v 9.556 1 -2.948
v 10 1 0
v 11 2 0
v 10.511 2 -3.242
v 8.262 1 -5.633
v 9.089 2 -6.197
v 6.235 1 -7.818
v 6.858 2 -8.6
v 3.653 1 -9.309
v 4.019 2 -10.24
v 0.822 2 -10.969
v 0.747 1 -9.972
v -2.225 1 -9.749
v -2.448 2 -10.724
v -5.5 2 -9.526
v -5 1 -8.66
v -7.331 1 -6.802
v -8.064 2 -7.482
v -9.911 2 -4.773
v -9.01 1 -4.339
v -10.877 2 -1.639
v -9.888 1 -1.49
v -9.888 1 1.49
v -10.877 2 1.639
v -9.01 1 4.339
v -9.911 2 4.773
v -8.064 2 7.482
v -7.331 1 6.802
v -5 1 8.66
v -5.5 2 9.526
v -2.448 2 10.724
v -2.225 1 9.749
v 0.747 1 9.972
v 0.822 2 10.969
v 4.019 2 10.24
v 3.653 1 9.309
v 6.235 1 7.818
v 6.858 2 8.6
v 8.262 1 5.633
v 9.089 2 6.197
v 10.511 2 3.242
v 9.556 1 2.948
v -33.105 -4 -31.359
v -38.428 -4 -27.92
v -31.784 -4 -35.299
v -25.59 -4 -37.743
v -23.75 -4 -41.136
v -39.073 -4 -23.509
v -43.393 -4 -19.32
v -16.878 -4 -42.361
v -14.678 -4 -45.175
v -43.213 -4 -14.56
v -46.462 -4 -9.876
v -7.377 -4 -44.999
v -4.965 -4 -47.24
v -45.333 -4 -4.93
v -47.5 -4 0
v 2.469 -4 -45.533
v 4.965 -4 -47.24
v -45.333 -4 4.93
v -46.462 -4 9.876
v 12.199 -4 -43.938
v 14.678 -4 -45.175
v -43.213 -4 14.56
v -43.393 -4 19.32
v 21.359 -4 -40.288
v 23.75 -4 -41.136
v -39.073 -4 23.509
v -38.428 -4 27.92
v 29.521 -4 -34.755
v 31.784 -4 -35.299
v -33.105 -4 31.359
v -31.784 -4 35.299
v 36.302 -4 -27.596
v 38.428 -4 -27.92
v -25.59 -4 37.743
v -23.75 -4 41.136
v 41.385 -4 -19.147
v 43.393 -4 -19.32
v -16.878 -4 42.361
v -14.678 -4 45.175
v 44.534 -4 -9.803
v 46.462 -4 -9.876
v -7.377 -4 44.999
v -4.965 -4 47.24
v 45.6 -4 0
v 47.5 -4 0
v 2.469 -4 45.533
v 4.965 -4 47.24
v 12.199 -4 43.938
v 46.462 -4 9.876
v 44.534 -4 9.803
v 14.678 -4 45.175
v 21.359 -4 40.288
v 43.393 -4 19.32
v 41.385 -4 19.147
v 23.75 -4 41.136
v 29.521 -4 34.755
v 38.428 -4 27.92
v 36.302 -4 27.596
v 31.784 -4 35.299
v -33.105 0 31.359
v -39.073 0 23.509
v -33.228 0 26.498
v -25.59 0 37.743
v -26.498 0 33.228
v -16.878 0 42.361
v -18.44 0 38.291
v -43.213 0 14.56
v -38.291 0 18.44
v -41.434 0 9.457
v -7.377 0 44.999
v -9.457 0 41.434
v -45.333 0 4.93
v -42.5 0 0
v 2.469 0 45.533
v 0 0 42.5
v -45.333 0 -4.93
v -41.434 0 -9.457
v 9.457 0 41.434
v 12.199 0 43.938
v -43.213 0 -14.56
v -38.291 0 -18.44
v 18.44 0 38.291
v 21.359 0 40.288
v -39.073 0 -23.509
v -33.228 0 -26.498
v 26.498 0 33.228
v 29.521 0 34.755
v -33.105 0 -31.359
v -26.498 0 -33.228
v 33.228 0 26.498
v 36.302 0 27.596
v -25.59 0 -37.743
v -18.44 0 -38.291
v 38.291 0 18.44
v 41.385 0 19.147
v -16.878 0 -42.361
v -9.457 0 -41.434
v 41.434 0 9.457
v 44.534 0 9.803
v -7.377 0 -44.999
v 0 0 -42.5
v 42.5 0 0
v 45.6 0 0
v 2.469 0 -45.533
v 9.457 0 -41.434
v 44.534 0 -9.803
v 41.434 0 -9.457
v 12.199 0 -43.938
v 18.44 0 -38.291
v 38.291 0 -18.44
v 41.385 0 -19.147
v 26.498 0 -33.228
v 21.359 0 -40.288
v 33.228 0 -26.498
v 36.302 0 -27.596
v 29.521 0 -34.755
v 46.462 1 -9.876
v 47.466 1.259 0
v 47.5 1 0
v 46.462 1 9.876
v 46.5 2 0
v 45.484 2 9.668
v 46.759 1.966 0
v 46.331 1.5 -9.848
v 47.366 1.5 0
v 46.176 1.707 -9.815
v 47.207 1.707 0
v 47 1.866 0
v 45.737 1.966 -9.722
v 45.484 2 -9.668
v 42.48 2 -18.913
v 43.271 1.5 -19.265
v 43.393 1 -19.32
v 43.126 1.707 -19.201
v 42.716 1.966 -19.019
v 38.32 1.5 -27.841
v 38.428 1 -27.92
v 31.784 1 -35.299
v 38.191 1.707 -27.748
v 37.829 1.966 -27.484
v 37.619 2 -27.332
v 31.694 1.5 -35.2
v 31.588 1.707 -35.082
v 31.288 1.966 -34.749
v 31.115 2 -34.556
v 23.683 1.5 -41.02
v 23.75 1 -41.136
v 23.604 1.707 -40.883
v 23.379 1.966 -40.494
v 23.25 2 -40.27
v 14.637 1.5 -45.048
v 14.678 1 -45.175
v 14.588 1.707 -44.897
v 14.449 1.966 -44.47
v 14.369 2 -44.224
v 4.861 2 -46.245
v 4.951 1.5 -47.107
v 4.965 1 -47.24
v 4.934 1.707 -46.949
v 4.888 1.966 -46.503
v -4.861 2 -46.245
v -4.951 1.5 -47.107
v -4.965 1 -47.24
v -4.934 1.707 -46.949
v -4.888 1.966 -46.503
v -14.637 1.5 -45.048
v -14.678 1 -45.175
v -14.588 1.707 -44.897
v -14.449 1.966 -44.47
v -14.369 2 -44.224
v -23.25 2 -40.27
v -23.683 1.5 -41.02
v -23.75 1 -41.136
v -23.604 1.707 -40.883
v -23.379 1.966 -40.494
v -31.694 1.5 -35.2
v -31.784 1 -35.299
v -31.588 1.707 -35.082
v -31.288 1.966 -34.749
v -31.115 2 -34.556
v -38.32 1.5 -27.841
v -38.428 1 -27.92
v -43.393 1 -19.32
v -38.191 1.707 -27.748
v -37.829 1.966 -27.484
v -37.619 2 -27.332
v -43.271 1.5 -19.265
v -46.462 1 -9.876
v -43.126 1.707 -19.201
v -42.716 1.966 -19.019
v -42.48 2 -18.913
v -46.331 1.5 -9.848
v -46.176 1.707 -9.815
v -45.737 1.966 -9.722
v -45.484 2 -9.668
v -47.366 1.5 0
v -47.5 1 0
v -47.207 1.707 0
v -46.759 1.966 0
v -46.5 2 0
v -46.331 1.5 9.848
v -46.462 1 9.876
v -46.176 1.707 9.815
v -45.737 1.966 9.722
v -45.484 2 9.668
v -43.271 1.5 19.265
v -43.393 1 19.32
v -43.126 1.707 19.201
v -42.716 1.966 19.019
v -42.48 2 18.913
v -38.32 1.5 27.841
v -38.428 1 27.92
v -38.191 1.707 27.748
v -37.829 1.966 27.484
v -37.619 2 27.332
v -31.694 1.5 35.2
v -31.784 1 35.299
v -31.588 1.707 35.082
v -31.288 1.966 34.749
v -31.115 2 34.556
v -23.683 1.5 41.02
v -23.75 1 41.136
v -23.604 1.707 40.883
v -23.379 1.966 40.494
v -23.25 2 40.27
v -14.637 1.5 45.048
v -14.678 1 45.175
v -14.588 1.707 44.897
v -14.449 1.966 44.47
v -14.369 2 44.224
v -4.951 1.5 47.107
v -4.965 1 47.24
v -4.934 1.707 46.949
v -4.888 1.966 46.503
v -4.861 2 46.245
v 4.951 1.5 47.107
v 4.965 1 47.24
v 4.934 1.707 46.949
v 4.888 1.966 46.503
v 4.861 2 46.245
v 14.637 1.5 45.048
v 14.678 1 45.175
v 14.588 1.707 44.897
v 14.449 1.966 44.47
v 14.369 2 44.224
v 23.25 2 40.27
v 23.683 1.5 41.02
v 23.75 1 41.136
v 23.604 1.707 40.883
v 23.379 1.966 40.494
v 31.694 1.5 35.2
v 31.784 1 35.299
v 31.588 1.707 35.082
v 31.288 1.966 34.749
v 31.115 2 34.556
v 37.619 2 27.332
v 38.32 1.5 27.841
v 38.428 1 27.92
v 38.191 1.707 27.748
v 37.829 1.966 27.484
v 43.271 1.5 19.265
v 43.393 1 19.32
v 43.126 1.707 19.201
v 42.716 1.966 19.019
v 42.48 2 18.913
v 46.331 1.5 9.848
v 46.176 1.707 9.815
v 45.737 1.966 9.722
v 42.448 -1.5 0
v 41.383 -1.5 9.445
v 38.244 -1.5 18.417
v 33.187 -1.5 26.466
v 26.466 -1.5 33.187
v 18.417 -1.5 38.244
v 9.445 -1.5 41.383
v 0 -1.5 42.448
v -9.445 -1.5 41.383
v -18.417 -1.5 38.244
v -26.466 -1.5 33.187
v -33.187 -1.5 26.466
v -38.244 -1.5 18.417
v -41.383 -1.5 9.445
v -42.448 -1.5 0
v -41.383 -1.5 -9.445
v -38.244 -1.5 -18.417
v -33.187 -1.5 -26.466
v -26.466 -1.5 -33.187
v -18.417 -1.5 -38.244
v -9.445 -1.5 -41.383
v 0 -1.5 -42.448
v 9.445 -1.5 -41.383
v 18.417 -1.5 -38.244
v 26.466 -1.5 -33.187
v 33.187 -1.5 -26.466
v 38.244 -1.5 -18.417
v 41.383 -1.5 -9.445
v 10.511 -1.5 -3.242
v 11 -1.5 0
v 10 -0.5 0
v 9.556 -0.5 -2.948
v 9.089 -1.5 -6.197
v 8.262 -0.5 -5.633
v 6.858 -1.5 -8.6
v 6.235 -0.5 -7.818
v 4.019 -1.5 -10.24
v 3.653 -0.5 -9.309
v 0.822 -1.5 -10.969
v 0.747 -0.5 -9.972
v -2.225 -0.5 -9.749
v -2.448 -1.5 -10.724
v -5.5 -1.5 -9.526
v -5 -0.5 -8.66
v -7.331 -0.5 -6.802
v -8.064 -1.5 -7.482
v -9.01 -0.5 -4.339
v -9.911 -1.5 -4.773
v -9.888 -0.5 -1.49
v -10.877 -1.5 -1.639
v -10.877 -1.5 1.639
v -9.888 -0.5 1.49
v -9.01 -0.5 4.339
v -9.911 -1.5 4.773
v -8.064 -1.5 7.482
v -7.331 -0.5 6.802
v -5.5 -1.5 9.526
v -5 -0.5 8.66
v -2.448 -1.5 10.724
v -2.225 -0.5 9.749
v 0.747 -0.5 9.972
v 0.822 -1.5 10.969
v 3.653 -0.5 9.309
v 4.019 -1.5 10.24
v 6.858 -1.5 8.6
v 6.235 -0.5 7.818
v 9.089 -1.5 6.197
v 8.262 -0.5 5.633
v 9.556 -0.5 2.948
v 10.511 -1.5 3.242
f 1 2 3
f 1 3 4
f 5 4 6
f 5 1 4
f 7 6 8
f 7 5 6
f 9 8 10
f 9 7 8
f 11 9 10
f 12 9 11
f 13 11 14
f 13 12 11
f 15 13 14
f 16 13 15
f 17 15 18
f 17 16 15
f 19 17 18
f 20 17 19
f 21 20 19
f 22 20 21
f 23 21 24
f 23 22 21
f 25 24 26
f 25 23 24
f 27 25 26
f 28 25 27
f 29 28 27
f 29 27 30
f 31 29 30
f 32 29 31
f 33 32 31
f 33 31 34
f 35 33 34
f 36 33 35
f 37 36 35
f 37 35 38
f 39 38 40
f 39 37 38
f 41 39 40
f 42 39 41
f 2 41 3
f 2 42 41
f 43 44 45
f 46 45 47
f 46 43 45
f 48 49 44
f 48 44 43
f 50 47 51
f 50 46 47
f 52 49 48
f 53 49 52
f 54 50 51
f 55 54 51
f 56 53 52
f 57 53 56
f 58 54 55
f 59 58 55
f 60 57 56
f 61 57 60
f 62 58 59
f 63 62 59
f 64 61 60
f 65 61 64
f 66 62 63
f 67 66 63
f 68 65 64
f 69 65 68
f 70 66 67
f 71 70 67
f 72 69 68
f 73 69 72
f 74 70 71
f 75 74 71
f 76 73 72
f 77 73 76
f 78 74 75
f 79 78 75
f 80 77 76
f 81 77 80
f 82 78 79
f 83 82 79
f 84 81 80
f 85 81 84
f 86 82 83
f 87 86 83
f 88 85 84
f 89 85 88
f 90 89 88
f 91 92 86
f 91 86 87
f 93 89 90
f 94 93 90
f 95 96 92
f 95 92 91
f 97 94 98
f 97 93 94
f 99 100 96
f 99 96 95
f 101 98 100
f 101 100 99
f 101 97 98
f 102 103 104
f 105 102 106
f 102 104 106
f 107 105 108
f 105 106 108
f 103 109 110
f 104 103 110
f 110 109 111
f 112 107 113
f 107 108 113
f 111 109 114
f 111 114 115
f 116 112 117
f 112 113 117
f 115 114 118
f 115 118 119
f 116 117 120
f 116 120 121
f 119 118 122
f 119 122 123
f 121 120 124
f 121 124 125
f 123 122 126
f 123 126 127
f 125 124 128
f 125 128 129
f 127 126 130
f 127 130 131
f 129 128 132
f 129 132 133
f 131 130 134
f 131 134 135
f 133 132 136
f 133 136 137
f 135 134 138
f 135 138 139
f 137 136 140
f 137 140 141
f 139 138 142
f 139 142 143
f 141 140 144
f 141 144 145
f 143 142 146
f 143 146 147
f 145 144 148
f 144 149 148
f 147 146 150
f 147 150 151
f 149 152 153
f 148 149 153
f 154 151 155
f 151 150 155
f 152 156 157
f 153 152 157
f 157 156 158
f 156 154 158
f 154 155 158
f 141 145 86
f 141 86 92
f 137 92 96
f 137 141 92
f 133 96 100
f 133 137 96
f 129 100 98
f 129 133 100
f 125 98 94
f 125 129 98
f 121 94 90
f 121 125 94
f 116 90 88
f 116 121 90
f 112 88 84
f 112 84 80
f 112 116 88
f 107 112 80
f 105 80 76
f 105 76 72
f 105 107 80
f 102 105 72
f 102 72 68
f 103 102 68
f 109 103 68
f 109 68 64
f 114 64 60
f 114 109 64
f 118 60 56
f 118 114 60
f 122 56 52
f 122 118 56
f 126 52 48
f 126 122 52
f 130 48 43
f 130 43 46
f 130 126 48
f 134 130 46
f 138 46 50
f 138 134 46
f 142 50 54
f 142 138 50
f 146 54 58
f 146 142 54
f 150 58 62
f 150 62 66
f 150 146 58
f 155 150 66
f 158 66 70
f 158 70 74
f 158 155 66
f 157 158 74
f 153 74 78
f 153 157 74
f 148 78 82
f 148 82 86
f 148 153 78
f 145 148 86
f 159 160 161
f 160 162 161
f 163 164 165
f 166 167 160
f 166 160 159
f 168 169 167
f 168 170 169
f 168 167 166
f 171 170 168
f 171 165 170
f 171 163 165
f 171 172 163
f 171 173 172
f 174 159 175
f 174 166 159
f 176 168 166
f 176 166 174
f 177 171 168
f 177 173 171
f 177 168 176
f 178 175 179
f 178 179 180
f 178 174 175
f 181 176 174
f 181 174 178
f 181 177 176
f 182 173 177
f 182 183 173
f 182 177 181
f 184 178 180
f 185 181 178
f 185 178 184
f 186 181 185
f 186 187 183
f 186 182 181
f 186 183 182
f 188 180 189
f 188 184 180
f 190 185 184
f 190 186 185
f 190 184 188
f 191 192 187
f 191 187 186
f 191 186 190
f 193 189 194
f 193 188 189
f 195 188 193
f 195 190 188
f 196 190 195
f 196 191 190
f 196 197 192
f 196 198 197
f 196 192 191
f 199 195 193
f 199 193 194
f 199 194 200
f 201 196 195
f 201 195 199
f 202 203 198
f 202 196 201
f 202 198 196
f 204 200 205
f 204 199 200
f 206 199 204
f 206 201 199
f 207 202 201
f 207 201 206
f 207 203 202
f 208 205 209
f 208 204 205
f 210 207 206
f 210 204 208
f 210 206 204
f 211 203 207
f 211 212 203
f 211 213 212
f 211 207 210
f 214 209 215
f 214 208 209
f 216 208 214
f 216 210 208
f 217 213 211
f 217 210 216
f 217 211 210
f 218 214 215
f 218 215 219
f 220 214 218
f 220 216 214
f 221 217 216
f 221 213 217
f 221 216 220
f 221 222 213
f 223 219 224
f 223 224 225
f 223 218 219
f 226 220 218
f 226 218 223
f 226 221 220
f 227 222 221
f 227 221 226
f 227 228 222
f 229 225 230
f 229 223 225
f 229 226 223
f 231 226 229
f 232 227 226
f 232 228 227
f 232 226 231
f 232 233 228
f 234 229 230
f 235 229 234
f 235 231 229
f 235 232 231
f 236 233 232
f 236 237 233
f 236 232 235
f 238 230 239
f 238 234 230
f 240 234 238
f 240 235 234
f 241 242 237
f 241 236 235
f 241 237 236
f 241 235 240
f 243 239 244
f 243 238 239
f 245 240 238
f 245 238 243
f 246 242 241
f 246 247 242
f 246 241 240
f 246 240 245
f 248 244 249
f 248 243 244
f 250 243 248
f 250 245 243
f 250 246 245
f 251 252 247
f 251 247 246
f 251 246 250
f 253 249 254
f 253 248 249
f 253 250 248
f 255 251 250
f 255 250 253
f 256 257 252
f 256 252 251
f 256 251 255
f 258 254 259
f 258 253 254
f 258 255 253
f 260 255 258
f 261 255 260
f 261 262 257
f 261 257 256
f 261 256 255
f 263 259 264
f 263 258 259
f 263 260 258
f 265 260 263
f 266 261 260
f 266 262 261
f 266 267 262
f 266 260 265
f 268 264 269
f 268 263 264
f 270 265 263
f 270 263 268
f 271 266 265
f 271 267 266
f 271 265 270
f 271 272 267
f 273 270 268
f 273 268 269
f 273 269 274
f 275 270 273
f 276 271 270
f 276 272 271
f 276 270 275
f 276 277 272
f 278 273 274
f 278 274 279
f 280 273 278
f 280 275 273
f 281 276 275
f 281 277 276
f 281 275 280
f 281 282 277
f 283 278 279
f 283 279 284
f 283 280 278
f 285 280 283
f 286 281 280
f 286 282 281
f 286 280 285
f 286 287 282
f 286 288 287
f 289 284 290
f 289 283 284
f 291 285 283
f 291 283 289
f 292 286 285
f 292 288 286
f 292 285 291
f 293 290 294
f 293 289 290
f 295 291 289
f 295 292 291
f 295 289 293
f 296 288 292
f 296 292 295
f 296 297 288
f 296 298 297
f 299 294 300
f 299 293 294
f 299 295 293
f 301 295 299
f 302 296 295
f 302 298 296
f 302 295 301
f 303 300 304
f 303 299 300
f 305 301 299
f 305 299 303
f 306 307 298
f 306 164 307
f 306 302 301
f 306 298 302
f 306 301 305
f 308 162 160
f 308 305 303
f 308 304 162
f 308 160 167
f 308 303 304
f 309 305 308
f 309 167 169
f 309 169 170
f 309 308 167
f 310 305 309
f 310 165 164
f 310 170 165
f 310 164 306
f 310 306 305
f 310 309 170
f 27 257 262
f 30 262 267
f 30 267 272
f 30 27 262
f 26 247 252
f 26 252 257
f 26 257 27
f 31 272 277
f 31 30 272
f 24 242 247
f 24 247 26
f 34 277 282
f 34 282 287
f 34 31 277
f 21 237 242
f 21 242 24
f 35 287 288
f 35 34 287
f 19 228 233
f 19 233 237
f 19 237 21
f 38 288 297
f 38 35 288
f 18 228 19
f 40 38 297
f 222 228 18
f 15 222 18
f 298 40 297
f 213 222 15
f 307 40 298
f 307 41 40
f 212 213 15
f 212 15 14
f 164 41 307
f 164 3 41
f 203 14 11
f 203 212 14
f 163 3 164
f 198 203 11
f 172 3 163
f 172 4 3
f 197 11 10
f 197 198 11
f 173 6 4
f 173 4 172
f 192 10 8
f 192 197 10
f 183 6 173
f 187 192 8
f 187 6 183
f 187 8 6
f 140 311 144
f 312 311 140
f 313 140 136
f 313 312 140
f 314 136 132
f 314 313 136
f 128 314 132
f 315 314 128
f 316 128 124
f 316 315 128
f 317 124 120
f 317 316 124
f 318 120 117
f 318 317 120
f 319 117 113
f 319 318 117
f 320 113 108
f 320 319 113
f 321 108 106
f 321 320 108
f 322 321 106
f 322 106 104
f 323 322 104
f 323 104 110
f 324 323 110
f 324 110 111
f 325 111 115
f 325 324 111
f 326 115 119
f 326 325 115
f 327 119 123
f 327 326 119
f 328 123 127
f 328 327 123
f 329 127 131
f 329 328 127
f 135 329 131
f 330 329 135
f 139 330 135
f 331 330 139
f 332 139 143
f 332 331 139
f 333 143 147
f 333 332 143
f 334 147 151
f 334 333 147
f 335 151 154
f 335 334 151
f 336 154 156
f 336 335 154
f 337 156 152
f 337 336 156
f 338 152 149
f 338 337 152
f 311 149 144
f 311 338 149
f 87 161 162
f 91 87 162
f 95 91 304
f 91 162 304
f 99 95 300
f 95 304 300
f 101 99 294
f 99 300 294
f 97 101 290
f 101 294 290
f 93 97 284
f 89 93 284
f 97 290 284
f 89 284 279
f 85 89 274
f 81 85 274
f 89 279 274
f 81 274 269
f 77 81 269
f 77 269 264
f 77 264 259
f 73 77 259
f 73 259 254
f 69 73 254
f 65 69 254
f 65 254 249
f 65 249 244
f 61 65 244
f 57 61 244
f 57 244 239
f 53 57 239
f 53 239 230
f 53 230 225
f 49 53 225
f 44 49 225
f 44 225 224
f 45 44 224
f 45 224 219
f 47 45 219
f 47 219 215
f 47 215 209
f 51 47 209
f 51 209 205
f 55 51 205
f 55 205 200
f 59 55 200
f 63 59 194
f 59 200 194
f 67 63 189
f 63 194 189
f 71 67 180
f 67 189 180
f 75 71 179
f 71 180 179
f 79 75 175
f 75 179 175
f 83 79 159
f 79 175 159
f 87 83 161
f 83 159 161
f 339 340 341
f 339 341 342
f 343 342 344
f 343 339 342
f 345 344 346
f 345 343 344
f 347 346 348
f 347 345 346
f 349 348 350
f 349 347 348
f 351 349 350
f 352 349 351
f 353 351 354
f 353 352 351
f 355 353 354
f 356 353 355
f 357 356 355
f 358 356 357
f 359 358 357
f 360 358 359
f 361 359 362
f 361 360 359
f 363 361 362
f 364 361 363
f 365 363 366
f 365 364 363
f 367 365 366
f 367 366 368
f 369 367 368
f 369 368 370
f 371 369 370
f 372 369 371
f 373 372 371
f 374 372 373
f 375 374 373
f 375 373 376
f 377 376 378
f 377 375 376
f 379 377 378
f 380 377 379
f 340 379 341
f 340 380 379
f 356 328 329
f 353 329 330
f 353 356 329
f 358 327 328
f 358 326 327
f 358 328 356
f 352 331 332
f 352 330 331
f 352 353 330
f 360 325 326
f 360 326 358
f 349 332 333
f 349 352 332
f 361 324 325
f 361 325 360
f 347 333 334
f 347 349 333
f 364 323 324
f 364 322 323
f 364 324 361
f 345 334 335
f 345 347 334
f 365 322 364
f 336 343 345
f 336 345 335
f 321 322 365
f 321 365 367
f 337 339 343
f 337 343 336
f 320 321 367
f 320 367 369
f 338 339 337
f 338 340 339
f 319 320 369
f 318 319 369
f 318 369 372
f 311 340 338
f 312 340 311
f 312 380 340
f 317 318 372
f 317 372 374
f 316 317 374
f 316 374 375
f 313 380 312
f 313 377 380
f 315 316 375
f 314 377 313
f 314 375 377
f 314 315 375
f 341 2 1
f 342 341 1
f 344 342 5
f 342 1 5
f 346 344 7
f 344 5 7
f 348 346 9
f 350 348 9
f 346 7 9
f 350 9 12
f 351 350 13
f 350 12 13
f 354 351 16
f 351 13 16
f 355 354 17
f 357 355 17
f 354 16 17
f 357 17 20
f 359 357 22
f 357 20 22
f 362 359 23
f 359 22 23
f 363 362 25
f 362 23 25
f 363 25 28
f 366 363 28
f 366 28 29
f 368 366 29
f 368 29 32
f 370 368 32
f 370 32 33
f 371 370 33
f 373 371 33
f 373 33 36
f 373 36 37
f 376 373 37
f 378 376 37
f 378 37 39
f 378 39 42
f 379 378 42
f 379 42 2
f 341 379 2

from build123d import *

# Parameters (mm, degrees)
SKETCH1_R           = 47.5
BOSS_EXTRUDE1_DEPTH = 2
SKETCH2_R           = 42.5
BOSS_EXTRUDE2_DEPTH = 1.5
BOSS_EXTRUDE2_TAPER = 2
SKETCH5_R           = 10
CUT_EXTRUDE1_DEPTH  = 4
CHAMFER1_SIZE       = 1
SKETCH7_R           = 47.5
SKETCH7_R_2         = 45.6
BOSS_EXTRUDE3_DEPTH = 4
FILLET2_R           = 1


with BuildPart() as part:
    # Sketch1 → Boss-Extrude1 (new body)
    with BuildSketch(Plane(origin=(0, 0, 0), x_dir=(1, 0, 0), z_dir=(0, 1, 0))):
        Circle(SKETCH1_R)
    extrude(amount=BOSS_EXTRUDE1_DEPTH)

    # Sketch2 → Boss-Extrude2 (add)
    with BuildSketch(Plane.XZ):
        Circle(SKETCH2_R)
    extrude(amount=BOSS_EXTRUDE2_DEPTH, taper=BOSS_EXTRUDE2_TAPER)

    # Sketch5 → Cut-Extrude1 (cut)
    with BuildSketch(Plane(origin=(0, 2, 0), x_dir=(1, 0, 0), z_dir=(0, 1, 0))):
        Circle(SKETCH5_R)
    extrude(amount=-CUT_EXTRUDE1_DEPTH, mode=Mode.SUBTRACT)

    # Chamfer1
    chamfer1_edges = [part.edges().sort_by_distance(p)[0] for p in [
        (-10, -1.5, 0),
        (-10, 2, 0),
    ]]
    chamfer(chamfer1_edges, length=CHAMFER1_SIZE)

    # Sketch7 → Boss-Extrude3 (add)
    with BuildSketch(Plane.XZ):
        Circle(SKETCH7_R)
        Circle(SKETCH7_R_2, mode=Mode.SUBTRACT)
    extrude(amount=BOSS_EXTRUDE3_DEPTH)

    # Fillet2
    fillet2_edges = [part.edges().sort_by_distance(p)[0] for p in [
        (-47.5, 2, 0),
    ]]
    fillet(fillet2_edges, radius=FILLET2_R)


solid = part.part
